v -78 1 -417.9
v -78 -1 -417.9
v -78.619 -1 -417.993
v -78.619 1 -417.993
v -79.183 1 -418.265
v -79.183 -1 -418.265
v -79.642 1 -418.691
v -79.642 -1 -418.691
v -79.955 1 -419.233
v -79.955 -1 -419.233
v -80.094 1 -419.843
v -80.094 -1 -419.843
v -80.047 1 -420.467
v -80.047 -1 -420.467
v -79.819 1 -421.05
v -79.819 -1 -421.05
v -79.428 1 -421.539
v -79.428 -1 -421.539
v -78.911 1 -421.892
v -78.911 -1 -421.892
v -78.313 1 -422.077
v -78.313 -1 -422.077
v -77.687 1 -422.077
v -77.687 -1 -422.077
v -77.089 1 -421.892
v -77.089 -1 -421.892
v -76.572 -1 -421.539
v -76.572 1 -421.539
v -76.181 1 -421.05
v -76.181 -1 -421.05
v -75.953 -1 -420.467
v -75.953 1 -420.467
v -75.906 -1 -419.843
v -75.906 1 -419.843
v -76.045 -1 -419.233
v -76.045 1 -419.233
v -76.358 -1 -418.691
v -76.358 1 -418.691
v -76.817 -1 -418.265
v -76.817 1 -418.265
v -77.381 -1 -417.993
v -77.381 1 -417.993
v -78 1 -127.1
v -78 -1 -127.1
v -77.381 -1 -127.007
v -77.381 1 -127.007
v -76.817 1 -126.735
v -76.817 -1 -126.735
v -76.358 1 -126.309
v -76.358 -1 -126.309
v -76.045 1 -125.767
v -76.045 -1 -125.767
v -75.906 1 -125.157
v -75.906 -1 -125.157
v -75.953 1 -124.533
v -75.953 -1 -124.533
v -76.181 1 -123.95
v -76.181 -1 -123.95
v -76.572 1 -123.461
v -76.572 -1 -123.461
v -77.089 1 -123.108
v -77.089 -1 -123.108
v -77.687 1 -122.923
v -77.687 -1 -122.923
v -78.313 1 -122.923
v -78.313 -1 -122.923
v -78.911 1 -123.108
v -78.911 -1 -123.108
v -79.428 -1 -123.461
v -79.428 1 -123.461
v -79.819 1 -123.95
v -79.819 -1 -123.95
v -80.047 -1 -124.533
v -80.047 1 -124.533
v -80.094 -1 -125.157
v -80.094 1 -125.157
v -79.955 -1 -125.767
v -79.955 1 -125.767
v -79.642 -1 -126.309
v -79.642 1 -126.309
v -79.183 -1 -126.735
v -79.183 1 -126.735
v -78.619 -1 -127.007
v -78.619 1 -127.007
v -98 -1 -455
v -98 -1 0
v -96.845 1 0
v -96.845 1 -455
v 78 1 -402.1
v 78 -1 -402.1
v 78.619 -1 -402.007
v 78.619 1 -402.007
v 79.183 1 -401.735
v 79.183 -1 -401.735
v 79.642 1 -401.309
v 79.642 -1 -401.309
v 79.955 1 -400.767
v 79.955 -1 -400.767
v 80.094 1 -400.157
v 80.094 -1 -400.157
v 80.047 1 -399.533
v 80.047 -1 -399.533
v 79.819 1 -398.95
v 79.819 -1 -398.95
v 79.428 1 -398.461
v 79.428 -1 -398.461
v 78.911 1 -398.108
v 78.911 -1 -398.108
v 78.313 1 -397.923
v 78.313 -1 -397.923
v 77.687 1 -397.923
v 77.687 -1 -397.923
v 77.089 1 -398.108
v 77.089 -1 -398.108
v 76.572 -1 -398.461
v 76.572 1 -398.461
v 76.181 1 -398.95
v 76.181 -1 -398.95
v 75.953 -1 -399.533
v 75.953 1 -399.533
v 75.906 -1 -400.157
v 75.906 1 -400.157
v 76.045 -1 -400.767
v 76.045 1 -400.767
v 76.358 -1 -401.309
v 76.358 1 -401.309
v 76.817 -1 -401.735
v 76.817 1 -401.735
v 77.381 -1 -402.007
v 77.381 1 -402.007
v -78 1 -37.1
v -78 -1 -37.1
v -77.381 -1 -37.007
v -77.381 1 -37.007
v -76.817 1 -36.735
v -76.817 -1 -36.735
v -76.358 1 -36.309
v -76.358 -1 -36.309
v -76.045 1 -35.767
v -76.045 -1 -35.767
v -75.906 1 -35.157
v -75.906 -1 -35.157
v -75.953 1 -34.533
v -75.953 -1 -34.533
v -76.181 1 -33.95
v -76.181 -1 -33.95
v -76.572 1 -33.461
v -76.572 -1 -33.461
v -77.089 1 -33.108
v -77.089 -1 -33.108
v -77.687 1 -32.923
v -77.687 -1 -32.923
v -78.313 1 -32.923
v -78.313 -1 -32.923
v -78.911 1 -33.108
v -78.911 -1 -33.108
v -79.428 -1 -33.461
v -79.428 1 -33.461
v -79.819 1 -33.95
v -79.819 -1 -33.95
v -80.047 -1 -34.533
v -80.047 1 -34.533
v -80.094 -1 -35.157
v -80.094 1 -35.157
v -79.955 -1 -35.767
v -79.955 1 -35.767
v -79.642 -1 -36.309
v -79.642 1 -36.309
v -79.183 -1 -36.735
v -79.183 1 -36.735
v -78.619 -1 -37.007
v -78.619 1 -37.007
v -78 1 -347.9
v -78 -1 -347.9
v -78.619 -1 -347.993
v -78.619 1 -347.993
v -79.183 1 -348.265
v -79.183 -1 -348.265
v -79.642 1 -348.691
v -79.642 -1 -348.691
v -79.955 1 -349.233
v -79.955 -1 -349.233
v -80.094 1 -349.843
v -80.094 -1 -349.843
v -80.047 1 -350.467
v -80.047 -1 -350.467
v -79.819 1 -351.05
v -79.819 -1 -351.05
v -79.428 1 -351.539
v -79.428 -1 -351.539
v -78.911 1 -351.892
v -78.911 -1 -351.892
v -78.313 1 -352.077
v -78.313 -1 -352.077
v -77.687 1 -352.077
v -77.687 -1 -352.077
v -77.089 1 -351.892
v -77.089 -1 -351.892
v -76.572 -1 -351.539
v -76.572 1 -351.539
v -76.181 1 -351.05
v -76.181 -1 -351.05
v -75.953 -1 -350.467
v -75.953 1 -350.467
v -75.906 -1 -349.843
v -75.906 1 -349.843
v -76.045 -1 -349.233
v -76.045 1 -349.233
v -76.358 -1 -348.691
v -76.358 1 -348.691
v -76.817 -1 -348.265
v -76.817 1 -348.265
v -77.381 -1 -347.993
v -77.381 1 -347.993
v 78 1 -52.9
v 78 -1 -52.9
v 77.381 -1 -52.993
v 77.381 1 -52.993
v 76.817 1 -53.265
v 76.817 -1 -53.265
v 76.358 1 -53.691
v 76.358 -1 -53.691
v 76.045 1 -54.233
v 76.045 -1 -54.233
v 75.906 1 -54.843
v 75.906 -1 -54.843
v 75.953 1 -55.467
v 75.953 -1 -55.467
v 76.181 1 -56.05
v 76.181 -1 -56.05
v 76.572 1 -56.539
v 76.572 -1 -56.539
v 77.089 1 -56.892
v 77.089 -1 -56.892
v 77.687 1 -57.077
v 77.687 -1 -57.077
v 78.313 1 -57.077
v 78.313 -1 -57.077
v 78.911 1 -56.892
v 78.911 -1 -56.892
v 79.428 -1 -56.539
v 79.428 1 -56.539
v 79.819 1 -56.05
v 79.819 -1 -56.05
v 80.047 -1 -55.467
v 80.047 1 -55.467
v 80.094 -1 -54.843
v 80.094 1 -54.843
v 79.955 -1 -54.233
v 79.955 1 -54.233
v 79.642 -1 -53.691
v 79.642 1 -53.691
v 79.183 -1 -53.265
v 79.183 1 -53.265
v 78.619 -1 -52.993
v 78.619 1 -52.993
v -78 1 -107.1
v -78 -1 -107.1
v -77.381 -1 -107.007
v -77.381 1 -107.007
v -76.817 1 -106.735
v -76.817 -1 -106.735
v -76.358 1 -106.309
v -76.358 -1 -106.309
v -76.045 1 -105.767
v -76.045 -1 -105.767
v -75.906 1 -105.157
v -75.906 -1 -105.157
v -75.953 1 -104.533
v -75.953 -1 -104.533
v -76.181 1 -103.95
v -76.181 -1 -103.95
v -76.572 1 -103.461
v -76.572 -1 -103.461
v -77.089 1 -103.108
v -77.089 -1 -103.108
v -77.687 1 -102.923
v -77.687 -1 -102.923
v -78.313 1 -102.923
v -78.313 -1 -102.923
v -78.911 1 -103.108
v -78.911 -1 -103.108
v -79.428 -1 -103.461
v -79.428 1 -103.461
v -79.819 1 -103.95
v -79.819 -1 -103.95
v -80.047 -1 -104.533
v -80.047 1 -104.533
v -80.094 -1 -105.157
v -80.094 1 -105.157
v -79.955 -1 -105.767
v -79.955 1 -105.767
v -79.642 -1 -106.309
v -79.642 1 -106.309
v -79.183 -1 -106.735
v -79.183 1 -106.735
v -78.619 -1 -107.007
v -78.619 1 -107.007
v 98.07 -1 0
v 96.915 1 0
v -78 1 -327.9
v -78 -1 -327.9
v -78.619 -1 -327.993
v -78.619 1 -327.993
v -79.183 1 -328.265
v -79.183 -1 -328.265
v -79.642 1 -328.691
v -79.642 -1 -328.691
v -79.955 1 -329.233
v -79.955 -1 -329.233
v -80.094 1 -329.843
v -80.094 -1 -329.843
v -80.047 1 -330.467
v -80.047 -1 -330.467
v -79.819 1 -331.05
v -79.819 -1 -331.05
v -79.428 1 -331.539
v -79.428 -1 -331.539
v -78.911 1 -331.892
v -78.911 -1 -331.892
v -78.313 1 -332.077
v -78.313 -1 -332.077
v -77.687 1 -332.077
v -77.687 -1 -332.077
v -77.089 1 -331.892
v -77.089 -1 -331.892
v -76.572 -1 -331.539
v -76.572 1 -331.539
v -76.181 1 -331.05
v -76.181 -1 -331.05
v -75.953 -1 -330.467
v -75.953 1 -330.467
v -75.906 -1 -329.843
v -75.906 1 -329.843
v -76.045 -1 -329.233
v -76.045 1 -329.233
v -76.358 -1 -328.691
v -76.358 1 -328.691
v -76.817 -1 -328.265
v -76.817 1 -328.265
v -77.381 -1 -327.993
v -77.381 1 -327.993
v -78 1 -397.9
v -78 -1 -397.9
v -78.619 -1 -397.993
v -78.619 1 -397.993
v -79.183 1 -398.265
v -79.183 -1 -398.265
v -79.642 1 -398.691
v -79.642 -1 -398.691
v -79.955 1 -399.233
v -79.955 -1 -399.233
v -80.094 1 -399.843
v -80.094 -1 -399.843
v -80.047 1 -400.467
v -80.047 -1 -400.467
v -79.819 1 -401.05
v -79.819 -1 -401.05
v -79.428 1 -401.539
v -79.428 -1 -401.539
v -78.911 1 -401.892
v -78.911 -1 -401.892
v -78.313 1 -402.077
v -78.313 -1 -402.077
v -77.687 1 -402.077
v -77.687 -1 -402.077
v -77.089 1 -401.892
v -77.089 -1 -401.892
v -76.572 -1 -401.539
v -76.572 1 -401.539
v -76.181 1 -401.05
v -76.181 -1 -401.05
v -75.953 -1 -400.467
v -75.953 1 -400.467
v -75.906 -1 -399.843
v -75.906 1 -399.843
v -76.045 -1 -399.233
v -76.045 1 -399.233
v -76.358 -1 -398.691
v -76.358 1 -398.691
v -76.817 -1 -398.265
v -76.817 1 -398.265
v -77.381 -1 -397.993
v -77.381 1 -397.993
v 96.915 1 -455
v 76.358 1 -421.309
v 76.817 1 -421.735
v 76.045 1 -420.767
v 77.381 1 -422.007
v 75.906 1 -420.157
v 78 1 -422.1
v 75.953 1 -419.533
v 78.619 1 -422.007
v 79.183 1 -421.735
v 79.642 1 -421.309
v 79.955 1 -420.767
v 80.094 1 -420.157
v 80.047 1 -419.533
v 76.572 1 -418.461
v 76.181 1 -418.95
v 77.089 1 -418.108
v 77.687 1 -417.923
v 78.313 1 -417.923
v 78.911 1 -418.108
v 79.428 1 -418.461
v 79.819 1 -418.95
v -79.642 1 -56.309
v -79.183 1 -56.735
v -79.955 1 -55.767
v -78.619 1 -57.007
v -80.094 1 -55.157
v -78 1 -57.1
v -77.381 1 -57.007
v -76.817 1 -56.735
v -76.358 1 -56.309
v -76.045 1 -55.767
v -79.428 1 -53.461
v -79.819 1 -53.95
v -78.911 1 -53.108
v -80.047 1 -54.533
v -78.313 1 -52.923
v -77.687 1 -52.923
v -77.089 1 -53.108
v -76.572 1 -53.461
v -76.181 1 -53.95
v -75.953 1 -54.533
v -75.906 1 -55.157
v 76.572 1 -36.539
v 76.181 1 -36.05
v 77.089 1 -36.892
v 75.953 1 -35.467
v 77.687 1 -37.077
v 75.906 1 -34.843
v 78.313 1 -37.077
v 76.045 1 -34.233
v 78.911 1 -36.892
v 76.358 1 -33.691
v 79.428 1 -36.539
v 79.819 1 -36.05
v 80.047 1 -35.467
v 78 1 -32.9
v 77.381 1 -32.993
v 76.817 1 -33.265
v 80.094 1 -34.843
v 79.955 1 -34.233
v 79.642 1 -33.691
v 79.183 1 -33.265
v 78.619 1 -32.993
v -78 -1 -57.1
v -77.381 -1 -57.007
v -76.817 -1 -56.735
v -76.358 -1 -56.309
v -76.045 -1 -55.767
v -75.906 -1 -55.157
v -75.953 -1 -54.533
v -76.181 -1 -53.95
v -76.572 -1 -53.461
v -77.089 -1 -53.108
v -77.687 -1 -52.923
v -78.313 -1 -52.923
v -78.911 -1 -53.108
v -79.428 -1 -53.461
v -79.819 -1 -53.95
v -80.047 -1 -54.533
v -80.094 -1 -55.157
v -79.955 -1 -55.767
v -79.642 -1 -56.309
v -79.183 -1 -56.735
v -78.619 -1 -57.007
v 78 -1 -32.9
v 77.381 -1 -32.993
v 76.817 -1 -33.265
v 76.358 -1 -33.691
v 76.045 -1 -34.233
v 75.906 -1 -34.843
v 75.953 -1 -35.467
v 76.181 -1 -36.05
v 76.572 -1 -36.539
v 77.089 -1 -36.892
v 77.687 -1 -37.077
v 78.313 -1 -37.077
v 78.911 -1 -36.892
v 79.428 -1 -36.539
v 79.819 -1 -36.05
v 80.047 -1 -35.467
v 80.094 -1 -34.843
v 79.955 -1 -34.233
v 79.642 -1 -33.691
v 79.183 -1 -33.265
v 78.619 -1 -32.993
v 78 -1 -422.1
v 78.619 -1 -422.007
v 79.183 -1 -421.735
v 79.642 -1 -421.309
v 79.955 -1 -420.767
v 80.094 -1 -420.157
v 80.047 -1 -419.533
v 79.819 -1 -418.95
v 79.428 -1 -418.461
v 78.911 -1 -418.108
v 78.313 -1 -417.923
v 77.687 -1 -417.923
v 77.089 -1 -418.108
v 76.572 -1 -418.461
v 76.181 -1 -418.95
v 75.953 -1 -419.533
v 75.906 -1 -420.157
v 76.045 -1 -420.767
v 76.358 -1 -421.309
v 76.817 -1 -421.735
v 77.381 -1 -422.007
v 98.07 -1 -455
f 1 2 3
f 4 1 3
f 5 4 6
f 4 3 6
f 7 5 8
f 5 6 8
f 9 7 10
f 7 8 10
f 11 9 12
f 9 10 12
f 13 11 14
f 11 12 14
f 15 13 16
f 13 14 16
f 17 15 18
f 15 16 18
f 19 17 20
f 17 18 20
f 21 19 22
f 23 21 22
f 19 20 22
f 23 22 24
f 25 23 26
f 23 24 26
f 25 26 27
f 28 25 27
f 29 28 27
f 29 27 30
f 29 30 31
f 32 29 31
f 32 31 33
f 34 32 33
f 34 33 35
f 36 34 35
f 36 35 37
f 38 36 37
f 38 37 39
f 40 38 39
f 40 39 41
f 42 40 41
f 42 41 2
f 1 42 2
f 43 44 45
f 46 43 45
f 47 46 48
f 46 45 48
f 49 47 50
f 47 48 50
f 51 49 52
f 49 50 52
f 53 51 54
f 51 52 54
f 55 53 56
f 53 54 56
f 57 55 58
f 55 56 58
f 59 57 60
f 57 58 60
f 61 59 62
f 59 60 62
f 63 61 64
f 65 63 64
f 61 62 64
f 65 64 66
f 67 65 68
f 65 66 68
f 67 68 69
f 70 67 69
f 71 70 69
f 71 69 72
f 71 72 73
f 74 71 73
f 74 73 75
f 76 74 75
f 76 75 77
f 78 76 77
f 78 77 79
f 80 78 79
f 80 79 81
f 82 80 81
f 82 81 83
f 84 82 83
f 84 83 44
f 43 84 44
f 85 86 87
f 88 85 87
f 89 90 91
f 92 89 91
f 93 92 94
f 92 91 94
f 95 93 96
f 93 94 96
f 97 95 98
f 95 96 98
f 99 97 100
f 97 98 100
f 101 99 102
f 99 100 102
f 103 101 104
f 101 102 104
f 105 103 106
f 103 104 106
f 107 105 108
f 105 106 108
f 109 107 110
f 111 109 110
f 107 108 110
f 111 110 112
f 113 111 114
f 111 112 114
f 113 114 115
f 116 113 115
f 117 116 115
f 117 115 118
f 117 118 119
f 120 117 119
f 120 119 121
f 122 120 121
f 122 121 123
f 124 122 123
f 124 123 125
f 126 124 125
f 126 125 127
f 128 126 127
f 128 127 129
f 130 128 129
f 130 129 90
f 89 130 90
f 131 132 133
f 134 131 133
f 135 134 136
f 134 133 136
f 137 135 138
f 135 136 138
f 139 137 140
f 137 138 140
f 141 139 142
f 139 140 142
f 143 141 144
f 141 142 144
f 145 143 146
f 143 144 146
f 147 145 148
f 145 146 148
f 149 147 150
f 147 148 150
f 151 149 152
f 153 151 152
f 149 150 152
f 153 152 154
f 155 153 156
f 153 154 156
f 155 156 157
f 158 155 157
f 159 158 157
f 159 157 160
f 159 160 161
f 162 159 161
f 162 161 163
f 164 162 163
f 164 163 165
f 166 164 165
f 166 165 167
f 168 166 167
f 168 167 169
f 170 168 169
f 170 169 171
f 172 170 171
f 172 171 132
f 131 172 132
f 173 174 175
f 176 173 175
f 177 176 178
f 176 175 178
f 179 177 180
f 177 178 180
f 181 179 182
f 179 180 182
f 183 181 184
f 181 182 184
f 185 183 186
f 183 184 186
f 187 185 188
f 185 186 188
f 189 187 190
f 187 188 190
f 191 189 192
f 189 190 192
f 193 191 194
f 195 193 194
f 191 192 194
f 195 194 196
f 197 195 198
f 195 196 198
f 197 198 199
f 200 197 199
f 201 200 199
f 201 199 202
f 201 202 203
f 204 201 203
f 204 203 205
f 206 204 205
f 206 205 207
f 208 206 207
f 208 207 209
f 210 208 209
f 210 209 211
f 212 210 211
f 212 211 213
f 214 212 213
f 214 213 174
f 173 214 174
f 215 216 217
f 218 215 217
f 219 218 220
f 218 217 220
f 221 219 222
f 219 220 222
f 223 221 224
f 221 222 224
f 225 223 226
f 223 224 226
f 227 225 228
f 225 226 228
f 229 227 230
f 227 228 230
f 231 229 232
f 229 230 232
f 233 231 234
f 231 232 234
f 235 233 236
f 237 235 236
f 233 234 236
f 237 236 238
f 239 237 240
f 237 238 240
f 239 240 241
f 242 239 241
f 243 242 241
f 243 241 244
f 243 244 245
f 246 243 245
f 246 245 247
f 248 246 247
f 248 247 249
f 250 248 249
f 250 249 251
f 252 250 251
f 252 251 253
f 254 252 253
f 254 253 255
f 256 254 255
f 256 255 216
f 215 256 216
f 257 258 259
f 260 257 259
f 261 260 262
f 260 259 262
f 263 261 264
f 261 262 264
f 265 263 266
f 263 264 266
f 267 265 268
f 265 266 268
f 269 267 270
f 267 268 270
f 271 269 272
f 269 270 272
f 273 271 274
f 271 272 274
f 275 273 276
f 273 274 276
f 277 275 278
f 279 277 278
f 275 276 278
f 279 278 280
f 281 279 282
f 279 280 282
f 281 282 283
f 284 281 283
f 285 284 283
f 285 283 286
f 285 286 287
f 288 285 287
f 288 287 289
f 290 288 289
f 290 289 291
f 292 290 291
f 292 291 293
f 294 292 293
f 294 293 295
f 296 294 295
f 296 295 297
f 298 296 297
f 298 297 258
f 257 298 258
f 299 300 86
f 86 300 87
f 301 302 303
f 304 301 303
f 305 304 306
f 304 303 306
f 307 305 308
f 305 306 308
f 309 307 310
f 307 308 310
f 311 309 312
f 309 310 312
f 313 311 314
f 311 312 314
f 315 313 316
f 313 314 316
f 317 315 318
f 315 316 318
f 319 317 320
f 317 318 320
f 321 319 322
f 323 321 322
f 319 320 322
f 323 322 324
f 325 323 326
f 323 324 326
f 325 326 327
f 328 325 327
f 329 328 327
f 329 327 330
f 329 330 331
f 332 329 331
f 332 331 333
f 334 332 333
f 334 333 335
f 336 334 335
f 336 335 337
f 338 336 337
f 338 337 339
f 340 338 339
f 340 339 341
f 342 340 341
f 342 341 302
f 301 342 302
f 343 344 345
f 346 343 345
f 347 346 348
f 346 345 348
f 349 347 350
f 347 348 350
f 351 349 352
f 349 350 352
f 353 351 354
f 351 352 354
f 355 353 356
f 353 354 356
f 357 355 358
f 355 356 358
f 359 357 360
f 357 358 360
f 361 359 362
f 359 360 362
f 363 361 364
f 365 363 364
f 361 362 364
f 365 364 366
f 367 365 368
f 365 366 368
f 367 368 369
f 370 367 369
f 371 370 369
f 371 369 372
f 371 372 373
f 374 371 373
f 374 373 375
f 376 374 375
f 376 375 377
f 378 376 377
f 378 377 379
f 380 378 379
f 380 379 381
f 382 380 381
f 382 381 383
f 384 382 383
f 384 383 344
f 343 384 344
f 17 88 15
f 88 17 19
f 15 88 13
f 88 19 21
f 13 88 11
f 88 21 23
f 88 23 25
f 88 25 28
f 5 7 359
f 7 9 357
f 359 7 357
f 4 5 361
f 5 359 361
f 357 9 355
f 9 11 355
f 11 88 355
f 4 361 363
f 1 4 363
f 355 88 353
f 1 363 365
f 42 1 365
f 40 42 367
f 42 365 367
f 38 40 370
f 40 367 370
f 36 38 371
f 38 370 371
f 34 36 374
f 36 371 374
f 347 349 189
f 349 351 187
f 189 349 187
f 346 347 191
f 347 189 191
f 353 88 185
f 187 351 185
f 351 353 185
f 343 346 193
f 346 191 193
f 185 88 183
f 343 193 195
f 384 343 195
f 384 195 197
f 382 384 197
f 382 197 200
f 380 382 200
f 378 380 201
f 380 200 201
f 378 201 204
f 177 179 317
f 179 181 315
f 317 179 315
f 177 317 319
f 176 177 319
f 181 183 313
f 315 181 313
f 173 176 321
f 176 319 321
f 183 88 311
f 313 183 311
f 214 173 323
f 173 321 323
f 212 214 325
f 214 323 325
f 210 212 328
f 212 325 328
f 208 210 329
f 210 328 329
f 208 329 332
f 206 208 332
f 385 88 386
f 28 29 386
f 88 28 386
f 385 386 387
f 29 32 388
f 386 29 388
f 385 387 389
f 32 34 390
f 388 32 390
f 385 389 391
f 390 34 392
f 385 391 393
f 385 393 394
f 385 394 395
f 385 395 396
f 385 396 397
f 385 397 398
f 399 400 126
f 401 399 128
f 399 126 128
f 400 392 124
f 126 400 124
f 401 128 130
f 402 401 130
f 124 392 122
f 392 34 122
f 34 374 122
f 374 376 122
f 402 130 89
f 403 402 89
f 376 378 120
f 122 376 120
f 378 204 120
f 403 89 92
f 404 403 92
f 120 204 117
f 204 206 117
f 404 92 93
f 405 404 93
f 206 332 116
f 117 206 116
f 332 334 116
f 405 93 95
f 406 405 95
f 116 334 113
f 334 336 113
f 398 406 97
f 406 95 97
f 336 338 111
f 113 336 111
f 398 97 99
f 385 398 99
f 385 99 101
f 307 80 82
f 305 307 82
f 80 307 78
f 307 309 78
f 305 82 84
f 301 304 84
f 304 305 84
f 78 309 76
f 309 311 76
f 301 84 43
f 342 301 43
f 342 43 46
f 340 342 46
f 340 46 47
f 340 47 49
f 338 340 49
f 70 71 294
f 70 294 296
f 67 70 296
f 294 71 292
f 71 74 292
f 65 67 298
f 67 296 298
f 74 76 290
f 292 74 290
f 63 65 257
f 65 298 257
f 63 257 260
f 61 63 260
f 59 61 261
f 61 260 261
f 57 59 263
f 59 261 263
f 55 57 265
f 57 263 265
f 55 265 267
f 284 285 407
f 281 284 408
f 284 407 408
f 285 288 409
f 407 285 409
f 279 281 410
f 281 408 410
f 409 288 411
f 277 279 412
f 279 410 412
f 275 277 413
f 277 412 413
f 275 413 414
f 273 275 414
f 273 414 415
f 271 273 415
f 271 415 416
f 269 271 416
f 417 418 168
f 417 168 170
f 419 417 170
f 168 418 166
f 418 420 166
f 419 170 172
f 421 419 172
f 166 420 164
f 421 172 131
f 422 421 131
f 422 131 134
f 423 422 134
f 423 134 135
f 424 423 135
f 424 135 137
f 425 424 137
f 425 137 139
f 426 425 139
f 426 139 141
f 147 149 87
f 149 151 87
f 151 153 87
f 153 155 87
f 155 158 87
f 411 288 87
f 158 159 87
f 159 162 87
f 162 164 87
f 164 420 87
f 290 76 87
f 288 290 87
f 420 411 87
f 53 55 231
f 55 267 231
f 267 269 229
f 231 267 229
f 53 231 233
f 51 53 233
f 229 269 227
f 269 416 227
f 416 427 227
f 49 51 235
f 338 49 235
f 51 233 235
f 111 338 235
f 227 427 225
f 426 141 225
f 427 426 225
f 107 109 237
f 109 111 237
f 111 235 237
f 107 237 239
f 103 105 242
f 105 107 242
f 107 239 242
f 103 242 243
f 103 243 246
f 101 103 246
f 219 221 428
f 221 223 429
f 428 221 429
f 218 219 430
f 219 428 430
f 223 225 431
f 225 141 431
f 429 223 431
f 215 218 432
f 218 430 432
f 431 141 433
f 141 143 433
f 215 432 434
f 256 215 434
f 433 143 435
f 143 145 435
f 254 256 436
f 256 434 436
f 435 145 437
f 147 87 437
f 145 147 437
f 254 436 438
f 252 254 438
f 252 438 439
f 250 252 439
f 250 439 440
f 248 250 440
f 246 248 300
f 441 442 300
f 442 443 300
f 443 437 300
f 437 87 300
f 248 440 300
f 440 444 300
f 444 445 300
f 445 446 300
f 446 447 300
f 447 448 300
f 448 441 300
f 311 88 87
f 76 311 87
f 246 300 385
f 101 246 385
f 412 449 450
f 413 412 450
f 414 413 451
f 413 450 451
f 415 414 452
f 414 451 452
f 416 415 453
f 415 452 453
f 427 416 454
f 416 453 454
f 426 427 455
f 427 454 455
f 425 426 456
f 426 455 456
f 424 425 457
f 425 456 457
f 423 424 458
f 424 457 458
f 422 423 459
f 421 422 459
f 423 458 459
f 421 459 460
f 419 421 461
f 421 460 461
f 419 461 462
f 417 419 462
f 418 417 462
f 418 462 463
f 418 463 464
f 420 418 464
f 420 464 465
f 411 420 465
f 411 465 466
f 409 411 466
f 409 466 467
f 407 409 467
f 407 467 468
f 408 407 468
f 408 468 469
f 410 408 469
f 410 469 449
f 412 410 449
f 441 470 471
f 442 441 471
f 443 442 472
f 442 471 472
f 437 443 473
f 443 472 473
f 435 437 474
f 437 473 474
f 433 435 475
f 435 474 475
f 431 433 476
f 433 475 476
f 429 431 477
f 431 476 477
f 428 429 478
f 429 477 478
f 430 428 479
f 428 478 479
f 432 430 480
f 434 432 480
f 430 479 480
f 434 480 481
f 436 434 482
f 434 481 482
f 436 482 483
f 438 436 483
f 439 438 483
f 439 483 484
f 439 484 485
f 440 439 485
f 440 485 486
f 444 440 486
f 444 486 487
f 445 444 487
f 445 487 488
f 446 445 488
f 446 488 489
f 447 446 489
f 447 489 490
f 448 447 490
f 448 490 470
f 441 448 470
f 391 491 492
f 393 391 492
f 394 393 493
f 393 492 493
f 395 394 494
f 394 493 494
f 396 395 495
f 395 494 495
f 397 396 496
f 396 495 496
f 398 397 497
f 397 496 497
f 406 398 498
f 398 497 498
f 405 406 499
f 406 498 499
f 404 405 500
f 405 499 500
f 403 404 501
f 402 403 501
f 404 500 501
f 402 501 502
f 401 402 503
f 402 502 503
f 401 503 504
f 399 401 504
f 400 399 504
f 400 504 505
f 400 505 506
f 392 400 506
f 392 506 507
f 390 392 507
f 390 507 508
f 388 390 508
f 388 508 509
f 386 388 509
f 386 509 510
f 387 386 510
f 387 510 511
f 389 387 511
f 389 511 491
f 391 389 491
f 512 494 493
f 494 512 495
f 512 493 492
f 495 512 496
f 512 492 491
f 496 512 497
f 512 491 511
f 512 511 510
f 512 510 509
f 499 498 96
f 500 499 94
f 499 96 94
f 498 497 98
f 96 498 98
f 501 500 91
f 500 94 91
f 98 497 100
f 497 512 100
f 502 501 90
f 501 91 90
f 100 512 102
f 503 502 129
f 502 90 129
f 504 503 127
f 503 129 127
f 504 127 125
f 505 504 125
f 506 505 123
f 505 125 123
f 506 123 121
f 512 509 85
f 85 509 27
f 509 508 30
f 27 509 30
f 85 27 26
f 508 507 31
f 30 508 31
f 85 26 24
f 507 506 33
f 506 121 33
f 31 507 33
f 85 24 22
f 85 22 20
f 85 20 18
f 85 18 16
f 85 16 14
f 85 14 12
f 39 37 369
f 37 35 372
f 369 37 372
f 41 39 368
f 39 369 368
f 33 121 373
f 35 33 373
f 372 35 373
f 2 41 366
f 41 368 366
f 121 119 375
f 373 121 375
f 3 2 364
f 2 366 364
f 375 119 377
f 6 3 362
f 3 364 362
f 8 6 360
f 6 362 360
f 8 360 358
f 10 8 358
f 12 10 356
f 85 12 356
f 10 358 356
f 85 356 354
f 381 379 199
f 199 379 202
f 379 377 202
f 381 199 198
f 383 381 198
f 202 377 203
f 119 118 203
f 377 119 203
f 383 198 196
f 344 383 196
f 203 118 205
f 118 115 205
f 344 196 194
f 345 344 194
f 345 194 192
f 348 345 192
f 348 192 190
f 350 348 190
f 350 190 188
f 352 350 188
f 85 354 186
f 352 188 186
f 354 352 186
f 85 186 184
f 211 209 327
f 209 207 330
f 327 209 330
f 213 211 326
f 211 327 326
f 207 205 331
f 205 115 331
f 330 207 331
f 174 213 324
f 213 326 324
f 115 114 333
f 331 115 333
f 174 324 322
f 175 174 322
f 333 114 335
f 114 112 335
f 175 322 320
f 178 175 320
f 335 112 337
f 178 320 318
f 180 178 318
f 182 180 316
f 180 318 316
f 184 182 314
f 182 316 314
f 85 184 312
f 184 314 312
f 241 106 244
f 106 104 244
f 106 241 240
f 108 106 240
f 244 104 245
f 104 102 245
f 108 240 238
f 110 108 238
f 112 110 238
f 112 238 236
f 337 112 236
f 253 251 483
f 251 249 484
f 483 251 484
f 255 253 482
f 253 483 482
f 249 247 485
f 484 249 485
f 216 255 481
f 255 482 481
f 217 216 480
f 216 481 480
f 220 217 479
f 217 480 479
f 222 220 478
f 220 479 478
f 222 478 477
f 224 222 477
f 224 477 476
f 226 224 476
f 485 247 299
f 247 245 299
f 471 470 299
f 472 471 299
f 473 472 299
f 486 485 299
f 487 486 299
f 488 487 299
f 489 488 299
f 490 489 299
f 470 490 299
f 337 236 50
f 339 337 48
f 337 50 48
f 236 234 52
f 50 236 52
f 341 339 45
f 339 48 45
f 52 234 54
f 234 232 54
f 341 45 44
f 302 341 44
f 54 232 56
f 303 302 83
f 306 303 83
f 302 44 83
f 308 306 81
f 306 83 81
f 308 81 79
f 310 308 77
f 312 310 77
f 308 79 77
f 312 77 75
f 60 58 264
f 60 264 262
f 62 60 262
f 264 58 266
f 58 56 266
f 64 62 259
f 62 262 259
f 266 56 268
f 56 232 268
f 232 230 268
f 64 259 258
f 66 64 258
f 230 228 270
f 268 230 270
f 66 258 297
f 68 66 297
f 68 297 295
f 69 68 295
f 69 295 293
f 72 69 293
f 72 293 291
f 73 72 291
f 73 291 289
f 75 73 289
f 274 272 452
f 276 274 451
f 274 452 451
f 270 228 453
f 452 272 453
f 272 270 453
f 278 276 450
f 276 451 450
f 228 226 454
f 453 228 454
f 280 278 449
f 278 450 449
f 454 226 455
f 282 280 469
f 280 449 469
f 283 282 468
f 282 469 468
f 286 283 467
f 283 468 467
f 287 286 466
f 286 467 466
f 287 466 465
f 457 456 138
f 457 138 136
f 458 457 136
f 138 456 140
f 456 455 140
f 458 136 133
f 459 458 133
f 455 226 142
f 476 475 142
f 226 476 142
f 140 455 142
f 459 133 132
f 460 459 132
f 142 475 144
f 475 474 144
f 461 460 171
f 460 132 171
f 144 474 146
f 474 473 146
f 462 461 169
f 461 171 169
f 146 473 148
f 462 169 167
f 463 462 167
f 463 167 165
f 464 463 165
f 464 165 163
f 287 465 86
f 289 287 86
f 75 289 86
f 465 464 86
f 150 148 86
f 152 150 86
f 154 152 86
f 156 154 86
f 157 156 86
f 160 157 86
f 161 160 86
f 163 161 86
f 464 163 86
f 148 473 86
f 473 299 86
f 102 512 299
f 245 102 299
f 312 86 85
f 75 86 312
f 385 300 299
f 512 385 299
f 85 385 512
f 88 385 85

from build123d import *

# Parameters (mm, degrees)
EXTRUDE_1_DEPTH     = 455
SKETCH_3_R          = 2.1
CUT_EXTRUDE_1_DEPTH = 466.453246739


with BuildPart() as part:
    # 草图2 → 凸台-拉伸1 (new body)
    with BuildSketch(Plane.XY):
        Polygon((-98, -1), (-96.845299462, 1), (96.915299462, 1), (98.07, -1), align=None)
    extrude(amount=-EXTRUDE_1_DEPTH)

    # 草图3 → 切除-拉伸1 (cut, through all)
    with BuildSketch(Plane(origin=(0, -1, 0), x_dir=(-1, 0, 0), z_dir=(0, -1, 0))):
        with Locations(Location((78, 35, 0), (0, 0, 90))):
            Circle(SKETCH_3_R)
        with Locations(Location((78, 55, 0), (0, 0, 90))):
            Circle(SKETCH_3_R)
        with Locations(Location((-78, 55, 0), (0, 0, 270))):
            Circle(SKETCH_3_R)
        with Locations(Location((-78, 35, 0), (0, 0, 270))):
            Circle(SKETCH_3_R)
        with Locations(Location((-78, 420, 0), (0, 0, 90))):
            Circle(SKETCH_3_R)
        with Locations(Location((-78, 400, 0), (0, 0, 90))):
            Circle(SKETCH_3_R)
        with Locations(Location((78, 400, 0), (0, 0, 270))):
            Circle(SKETCH_3_R)
        with Locations(Location((78, 420, 0), (0, 0, 270))):
            Circle(SKETCH_3_R)
        with Locations(Location((78, 105, 0), (0, 0, 90))):
            Circle(SKETCH_3_R)
        with Locations(Location((78, 125, 0), (0, 0, 90))):
            Circle(SKETCH_3_R)
        with Locations(Location((78, 350, 0), (0, 0, 270))):
            Circle(SKETCH_3_R)
        with Locations(Location((78, 330, 0), (0, 0, 270))):
            Circle(SKETCH_3_R)
    extrude(amount=-CUT_EXTRUDE_1_DEPTH, mode=Mode.SUBTRACT)


solid = part.part
